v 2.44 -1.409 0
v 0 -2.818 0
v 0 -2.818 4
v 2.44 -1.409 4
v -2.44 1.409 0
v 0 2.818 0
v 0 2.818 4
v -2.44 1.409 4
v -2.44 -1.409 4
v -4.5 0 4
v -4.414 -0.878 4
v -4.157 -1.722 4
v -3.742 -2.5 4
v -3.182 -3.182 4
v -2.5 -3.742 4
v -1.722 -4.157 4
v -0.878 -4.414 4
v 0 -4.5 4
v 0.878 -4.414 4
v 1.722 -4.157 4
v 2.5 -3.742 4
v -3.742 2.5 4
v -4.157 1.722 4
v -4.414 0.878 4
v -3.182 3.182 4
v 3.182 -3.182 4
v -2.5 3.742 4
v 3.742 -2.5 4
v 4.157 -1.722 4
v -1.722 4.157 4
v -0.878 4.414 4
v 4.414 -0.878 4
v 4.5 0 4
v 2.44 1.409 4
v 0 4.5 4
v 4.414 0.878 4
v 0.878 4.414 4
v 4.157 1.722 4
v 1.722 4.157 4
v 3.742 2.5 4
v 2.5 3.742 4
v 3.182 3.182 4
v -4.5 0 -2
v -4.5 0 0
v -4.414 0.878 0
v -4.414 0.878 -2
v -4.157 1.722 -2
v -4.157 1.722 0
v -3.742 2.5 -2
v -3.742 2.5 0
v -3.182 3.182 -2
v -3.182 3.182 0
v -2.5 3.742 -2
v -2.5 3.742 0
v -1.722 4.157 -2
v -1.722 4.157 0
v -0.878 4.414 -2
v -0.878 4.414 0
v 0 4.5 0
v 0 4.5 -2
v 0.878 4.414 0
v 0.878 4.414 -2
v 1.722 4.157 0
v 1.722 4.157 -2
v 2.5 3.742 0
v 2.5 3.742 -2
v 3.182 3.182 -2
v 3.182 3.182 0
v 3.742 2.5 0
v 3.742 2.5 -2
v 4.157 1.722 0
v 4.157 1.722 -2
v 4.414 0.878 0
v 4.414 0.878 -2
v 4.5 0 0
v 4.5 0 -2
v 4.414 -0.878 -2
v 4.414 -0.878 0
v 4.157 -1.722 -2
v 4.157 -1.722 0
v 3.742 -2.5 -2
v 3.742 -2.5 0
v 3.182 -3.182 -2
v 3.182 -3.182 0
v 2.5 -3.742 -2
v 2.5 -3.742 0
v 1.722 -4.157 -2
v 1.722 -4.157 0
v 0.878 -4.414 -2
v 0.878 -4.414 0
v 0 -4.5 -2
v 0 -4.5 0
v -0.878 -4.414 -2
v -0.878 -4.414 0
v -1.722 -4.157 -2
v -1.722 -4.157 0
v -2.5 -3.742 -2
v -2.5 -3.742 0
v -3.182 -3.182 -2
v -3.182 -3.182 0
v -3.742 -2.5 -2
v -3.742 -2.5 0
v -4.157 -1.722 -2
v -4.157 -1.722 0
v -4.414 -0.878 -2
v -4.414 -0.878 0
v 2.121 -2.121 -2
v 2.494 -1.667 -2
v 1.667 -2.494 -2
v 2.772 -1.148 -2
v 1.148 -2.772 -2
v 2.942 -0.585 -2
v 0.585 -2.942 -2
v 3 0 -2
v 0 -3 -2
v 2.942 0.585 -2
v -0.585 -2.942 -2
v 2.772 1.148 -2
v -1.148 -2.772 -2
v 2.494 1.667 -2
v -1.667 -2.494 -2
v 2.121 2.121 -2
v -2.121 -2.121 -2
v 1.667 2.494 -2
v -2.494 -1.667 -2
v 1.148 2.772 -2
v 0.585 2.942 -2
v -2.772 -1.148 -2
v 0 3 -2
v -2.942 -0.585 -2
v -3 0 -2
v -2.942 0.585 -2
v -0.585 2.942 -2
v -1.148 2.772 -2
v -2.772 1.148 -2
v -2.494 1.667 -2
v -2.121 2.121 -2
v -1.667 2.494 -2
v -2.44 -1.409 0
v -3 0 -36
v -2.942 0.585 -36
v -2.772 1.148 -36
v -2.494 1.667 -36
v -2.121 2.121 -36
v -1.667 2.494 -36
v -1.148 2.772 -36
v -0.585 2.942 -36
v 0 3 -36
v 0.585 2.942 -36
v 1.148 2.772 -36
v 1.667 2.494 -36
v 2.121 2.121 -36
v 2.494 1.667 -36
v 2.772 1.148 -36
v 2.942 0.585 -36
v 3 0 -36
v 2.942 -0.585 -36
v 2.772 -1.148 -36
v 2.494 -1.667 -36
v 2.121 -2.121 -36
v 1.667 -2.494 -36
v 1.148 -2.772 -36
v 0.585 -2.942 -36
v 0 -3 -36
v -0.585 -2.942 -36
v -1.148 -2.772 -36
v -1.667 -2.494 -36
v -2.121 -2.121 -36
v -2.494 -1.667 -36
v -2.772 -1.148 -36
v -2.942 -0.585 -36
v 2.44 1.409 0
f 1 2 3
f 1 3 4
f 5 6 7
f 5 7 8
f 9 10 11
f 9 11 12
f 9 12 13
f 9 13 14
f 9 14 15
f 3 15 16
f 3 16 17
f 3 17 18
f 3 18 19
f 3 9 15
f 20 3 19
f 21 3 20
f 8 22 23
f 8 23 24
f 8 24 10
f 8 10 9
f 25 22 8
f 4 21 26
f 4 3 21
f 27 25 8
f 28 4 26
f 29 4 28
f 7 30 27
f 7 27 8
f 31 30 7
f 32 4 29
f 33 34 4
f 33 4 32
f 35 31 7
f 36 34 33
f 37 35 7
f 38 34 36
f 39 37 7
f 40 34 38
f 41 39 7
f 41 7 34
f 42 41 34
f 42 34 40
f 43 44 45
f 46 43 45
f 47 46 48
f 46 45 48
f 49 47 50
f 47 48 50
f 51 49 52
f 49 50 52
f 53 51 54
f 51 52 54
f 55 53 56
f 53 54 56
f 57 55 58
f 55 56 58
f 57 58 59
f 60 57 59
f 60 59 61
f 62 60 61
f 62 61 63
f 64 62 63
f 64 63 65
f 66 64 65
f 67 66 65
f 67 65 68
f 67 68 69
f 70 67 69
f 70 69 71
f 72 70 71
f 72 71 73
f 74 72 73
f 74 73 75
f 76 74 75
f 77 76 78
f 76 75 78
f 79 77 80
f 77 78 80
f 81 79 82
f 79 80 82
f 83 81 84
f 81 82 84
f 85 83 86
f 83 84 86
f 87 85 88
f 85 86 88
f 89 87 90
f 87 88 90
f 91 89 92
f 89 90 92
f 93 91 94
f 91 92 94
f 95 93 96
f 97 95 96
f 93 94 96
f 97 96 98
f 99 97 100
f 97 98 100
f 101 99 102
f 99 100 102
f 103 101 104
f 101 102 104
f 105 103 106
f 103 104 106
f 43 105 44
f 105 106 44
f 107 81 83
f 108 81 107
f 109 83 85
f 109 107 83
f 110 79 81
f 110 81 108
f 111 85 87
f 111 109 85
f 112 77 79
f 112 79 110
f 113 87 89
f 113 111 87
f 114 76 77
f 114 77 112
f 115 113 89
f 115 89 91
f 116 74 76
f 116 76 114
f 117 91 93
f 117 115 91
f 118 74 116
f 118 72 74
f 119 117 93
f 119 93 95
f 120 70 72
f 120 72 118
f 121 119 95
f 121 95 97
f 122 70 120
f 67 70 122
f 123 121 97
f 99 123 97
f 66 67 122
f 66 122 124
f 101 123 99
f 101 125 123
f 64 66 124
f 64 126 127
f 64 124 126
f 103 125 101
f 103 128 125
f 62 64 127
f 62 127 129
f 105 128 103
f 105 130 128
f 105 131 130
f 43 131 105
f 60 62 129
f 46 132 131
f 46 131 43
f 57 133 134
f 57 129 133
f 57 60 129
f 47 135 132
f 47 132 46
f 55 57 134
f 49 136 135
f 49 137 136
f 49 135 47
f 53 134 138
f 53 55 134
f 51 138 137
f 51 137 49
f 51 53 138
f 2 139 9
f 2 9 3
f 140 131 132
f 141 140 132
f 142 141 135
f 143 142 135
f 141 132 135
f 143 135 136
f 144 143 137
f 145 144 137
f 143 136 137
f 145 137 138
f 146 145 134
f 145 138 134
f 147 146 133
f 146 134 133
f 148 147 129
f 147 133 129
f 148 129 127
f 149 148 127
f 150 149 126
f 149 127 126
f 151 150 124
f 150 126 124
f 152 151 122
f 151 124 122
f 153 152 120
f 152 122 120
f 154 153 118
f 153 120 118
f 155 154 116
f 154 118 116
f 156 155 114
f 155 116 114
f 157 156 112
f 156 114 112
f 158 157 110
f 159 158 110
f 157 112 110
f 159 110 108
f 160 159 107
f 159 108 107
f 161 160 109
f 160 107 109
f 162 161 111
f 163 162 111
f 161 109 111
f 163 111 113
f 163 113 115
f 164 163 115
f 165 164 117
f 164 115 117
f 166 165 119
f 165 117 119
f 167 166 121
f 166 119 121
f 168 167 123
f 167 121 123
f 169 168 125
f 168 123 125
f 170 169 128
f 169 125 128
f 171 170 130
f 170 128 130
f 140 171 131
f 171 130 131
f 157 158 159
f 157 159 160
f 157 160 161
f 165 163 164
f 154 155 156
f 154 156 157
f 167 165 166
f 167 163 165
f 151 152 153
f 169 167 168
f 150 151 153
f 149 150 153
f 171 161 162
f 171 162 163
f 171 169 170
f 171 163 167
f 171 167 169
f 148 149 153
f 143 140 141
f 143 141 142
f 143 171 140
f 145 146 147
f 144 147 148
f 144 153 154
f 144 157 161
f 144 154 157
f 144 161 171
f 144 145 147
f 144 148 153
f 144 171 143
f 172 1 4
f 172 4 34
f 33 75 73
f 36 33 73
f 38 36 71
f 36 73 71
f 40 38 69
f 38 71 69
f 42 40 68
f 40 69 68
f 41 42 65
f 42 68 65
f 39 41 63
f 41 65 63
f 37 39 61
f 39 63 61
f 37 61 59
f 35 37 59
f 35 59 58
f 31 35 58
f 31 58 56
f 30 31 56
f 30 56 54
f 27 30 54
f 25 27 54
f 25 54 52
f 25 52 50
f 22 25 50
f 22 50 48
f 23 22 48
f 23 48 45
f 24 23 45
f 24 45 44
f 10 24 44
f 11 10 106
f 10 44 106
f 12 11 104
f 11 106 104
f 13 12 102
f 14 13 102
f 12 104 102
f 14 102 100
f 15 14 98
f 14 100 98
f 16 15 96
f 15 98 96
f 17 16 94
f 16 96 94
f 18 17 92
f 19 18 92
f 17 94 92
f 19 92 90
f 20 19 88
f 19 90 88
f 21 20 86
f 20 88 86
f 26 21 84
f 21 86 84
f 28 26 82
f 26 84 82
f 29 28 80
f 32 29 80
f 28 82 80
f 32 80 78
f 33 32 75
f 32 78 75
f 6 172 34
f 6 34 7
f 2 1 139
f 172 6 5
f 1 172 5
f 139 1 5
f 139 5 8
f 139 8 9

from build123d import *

# Parameters (mm, degrees)
SKETCH1_R           = 4.5
BOSS_EXTRUDE1_DEPTH = 4
SKETCH2_R           = 4.5
BOSS_EXTRUDE2_DEPTH = 2
SKETCH3_R           = 3
BOSS_EXTRUDE3_DEPTH = 34


with BuildPart() as part:
    # Sketch1 → Boss-Extrude1 (new body)
    with BuildSketch(Plane.XY):
        Circle(SKETCH1_R)
        Polygon((0, 2.817703613), (-2.440202909, 1.408851806), (-2.440202909, -1.408851806), (0, -2.817703613), (2.440202909, -1.408851806), (2.440202909, 1.408851806), align=None, mode=Mode.SUBTRACT)
    extrude(amount=BOSS_EXTRUDE1_DEPTH)

    # Sketch2 → Boss-Extrude2 (add)
    with BuildSketch(Plane(origin=(0, 0, 0), x_dir=(-1, 0, 0), z_dir=(0, 0, -1))):
        Circle(SKETCH2_R)
    extrude(amount=BOSS_EXTRUDE2_DEPTH)

    # Sketch3 → Boss-Extrude3 (add)
    with BuildSketch(Plane(origin=(0, 0, -2), x_dir=(-1, 0, 0), z_dir=(0, 0, -1))):
        Circle(SKETCH3_R)
    extrude(amount=BOSS_EXTRUDE3_DEPTH)


solid = part.part
